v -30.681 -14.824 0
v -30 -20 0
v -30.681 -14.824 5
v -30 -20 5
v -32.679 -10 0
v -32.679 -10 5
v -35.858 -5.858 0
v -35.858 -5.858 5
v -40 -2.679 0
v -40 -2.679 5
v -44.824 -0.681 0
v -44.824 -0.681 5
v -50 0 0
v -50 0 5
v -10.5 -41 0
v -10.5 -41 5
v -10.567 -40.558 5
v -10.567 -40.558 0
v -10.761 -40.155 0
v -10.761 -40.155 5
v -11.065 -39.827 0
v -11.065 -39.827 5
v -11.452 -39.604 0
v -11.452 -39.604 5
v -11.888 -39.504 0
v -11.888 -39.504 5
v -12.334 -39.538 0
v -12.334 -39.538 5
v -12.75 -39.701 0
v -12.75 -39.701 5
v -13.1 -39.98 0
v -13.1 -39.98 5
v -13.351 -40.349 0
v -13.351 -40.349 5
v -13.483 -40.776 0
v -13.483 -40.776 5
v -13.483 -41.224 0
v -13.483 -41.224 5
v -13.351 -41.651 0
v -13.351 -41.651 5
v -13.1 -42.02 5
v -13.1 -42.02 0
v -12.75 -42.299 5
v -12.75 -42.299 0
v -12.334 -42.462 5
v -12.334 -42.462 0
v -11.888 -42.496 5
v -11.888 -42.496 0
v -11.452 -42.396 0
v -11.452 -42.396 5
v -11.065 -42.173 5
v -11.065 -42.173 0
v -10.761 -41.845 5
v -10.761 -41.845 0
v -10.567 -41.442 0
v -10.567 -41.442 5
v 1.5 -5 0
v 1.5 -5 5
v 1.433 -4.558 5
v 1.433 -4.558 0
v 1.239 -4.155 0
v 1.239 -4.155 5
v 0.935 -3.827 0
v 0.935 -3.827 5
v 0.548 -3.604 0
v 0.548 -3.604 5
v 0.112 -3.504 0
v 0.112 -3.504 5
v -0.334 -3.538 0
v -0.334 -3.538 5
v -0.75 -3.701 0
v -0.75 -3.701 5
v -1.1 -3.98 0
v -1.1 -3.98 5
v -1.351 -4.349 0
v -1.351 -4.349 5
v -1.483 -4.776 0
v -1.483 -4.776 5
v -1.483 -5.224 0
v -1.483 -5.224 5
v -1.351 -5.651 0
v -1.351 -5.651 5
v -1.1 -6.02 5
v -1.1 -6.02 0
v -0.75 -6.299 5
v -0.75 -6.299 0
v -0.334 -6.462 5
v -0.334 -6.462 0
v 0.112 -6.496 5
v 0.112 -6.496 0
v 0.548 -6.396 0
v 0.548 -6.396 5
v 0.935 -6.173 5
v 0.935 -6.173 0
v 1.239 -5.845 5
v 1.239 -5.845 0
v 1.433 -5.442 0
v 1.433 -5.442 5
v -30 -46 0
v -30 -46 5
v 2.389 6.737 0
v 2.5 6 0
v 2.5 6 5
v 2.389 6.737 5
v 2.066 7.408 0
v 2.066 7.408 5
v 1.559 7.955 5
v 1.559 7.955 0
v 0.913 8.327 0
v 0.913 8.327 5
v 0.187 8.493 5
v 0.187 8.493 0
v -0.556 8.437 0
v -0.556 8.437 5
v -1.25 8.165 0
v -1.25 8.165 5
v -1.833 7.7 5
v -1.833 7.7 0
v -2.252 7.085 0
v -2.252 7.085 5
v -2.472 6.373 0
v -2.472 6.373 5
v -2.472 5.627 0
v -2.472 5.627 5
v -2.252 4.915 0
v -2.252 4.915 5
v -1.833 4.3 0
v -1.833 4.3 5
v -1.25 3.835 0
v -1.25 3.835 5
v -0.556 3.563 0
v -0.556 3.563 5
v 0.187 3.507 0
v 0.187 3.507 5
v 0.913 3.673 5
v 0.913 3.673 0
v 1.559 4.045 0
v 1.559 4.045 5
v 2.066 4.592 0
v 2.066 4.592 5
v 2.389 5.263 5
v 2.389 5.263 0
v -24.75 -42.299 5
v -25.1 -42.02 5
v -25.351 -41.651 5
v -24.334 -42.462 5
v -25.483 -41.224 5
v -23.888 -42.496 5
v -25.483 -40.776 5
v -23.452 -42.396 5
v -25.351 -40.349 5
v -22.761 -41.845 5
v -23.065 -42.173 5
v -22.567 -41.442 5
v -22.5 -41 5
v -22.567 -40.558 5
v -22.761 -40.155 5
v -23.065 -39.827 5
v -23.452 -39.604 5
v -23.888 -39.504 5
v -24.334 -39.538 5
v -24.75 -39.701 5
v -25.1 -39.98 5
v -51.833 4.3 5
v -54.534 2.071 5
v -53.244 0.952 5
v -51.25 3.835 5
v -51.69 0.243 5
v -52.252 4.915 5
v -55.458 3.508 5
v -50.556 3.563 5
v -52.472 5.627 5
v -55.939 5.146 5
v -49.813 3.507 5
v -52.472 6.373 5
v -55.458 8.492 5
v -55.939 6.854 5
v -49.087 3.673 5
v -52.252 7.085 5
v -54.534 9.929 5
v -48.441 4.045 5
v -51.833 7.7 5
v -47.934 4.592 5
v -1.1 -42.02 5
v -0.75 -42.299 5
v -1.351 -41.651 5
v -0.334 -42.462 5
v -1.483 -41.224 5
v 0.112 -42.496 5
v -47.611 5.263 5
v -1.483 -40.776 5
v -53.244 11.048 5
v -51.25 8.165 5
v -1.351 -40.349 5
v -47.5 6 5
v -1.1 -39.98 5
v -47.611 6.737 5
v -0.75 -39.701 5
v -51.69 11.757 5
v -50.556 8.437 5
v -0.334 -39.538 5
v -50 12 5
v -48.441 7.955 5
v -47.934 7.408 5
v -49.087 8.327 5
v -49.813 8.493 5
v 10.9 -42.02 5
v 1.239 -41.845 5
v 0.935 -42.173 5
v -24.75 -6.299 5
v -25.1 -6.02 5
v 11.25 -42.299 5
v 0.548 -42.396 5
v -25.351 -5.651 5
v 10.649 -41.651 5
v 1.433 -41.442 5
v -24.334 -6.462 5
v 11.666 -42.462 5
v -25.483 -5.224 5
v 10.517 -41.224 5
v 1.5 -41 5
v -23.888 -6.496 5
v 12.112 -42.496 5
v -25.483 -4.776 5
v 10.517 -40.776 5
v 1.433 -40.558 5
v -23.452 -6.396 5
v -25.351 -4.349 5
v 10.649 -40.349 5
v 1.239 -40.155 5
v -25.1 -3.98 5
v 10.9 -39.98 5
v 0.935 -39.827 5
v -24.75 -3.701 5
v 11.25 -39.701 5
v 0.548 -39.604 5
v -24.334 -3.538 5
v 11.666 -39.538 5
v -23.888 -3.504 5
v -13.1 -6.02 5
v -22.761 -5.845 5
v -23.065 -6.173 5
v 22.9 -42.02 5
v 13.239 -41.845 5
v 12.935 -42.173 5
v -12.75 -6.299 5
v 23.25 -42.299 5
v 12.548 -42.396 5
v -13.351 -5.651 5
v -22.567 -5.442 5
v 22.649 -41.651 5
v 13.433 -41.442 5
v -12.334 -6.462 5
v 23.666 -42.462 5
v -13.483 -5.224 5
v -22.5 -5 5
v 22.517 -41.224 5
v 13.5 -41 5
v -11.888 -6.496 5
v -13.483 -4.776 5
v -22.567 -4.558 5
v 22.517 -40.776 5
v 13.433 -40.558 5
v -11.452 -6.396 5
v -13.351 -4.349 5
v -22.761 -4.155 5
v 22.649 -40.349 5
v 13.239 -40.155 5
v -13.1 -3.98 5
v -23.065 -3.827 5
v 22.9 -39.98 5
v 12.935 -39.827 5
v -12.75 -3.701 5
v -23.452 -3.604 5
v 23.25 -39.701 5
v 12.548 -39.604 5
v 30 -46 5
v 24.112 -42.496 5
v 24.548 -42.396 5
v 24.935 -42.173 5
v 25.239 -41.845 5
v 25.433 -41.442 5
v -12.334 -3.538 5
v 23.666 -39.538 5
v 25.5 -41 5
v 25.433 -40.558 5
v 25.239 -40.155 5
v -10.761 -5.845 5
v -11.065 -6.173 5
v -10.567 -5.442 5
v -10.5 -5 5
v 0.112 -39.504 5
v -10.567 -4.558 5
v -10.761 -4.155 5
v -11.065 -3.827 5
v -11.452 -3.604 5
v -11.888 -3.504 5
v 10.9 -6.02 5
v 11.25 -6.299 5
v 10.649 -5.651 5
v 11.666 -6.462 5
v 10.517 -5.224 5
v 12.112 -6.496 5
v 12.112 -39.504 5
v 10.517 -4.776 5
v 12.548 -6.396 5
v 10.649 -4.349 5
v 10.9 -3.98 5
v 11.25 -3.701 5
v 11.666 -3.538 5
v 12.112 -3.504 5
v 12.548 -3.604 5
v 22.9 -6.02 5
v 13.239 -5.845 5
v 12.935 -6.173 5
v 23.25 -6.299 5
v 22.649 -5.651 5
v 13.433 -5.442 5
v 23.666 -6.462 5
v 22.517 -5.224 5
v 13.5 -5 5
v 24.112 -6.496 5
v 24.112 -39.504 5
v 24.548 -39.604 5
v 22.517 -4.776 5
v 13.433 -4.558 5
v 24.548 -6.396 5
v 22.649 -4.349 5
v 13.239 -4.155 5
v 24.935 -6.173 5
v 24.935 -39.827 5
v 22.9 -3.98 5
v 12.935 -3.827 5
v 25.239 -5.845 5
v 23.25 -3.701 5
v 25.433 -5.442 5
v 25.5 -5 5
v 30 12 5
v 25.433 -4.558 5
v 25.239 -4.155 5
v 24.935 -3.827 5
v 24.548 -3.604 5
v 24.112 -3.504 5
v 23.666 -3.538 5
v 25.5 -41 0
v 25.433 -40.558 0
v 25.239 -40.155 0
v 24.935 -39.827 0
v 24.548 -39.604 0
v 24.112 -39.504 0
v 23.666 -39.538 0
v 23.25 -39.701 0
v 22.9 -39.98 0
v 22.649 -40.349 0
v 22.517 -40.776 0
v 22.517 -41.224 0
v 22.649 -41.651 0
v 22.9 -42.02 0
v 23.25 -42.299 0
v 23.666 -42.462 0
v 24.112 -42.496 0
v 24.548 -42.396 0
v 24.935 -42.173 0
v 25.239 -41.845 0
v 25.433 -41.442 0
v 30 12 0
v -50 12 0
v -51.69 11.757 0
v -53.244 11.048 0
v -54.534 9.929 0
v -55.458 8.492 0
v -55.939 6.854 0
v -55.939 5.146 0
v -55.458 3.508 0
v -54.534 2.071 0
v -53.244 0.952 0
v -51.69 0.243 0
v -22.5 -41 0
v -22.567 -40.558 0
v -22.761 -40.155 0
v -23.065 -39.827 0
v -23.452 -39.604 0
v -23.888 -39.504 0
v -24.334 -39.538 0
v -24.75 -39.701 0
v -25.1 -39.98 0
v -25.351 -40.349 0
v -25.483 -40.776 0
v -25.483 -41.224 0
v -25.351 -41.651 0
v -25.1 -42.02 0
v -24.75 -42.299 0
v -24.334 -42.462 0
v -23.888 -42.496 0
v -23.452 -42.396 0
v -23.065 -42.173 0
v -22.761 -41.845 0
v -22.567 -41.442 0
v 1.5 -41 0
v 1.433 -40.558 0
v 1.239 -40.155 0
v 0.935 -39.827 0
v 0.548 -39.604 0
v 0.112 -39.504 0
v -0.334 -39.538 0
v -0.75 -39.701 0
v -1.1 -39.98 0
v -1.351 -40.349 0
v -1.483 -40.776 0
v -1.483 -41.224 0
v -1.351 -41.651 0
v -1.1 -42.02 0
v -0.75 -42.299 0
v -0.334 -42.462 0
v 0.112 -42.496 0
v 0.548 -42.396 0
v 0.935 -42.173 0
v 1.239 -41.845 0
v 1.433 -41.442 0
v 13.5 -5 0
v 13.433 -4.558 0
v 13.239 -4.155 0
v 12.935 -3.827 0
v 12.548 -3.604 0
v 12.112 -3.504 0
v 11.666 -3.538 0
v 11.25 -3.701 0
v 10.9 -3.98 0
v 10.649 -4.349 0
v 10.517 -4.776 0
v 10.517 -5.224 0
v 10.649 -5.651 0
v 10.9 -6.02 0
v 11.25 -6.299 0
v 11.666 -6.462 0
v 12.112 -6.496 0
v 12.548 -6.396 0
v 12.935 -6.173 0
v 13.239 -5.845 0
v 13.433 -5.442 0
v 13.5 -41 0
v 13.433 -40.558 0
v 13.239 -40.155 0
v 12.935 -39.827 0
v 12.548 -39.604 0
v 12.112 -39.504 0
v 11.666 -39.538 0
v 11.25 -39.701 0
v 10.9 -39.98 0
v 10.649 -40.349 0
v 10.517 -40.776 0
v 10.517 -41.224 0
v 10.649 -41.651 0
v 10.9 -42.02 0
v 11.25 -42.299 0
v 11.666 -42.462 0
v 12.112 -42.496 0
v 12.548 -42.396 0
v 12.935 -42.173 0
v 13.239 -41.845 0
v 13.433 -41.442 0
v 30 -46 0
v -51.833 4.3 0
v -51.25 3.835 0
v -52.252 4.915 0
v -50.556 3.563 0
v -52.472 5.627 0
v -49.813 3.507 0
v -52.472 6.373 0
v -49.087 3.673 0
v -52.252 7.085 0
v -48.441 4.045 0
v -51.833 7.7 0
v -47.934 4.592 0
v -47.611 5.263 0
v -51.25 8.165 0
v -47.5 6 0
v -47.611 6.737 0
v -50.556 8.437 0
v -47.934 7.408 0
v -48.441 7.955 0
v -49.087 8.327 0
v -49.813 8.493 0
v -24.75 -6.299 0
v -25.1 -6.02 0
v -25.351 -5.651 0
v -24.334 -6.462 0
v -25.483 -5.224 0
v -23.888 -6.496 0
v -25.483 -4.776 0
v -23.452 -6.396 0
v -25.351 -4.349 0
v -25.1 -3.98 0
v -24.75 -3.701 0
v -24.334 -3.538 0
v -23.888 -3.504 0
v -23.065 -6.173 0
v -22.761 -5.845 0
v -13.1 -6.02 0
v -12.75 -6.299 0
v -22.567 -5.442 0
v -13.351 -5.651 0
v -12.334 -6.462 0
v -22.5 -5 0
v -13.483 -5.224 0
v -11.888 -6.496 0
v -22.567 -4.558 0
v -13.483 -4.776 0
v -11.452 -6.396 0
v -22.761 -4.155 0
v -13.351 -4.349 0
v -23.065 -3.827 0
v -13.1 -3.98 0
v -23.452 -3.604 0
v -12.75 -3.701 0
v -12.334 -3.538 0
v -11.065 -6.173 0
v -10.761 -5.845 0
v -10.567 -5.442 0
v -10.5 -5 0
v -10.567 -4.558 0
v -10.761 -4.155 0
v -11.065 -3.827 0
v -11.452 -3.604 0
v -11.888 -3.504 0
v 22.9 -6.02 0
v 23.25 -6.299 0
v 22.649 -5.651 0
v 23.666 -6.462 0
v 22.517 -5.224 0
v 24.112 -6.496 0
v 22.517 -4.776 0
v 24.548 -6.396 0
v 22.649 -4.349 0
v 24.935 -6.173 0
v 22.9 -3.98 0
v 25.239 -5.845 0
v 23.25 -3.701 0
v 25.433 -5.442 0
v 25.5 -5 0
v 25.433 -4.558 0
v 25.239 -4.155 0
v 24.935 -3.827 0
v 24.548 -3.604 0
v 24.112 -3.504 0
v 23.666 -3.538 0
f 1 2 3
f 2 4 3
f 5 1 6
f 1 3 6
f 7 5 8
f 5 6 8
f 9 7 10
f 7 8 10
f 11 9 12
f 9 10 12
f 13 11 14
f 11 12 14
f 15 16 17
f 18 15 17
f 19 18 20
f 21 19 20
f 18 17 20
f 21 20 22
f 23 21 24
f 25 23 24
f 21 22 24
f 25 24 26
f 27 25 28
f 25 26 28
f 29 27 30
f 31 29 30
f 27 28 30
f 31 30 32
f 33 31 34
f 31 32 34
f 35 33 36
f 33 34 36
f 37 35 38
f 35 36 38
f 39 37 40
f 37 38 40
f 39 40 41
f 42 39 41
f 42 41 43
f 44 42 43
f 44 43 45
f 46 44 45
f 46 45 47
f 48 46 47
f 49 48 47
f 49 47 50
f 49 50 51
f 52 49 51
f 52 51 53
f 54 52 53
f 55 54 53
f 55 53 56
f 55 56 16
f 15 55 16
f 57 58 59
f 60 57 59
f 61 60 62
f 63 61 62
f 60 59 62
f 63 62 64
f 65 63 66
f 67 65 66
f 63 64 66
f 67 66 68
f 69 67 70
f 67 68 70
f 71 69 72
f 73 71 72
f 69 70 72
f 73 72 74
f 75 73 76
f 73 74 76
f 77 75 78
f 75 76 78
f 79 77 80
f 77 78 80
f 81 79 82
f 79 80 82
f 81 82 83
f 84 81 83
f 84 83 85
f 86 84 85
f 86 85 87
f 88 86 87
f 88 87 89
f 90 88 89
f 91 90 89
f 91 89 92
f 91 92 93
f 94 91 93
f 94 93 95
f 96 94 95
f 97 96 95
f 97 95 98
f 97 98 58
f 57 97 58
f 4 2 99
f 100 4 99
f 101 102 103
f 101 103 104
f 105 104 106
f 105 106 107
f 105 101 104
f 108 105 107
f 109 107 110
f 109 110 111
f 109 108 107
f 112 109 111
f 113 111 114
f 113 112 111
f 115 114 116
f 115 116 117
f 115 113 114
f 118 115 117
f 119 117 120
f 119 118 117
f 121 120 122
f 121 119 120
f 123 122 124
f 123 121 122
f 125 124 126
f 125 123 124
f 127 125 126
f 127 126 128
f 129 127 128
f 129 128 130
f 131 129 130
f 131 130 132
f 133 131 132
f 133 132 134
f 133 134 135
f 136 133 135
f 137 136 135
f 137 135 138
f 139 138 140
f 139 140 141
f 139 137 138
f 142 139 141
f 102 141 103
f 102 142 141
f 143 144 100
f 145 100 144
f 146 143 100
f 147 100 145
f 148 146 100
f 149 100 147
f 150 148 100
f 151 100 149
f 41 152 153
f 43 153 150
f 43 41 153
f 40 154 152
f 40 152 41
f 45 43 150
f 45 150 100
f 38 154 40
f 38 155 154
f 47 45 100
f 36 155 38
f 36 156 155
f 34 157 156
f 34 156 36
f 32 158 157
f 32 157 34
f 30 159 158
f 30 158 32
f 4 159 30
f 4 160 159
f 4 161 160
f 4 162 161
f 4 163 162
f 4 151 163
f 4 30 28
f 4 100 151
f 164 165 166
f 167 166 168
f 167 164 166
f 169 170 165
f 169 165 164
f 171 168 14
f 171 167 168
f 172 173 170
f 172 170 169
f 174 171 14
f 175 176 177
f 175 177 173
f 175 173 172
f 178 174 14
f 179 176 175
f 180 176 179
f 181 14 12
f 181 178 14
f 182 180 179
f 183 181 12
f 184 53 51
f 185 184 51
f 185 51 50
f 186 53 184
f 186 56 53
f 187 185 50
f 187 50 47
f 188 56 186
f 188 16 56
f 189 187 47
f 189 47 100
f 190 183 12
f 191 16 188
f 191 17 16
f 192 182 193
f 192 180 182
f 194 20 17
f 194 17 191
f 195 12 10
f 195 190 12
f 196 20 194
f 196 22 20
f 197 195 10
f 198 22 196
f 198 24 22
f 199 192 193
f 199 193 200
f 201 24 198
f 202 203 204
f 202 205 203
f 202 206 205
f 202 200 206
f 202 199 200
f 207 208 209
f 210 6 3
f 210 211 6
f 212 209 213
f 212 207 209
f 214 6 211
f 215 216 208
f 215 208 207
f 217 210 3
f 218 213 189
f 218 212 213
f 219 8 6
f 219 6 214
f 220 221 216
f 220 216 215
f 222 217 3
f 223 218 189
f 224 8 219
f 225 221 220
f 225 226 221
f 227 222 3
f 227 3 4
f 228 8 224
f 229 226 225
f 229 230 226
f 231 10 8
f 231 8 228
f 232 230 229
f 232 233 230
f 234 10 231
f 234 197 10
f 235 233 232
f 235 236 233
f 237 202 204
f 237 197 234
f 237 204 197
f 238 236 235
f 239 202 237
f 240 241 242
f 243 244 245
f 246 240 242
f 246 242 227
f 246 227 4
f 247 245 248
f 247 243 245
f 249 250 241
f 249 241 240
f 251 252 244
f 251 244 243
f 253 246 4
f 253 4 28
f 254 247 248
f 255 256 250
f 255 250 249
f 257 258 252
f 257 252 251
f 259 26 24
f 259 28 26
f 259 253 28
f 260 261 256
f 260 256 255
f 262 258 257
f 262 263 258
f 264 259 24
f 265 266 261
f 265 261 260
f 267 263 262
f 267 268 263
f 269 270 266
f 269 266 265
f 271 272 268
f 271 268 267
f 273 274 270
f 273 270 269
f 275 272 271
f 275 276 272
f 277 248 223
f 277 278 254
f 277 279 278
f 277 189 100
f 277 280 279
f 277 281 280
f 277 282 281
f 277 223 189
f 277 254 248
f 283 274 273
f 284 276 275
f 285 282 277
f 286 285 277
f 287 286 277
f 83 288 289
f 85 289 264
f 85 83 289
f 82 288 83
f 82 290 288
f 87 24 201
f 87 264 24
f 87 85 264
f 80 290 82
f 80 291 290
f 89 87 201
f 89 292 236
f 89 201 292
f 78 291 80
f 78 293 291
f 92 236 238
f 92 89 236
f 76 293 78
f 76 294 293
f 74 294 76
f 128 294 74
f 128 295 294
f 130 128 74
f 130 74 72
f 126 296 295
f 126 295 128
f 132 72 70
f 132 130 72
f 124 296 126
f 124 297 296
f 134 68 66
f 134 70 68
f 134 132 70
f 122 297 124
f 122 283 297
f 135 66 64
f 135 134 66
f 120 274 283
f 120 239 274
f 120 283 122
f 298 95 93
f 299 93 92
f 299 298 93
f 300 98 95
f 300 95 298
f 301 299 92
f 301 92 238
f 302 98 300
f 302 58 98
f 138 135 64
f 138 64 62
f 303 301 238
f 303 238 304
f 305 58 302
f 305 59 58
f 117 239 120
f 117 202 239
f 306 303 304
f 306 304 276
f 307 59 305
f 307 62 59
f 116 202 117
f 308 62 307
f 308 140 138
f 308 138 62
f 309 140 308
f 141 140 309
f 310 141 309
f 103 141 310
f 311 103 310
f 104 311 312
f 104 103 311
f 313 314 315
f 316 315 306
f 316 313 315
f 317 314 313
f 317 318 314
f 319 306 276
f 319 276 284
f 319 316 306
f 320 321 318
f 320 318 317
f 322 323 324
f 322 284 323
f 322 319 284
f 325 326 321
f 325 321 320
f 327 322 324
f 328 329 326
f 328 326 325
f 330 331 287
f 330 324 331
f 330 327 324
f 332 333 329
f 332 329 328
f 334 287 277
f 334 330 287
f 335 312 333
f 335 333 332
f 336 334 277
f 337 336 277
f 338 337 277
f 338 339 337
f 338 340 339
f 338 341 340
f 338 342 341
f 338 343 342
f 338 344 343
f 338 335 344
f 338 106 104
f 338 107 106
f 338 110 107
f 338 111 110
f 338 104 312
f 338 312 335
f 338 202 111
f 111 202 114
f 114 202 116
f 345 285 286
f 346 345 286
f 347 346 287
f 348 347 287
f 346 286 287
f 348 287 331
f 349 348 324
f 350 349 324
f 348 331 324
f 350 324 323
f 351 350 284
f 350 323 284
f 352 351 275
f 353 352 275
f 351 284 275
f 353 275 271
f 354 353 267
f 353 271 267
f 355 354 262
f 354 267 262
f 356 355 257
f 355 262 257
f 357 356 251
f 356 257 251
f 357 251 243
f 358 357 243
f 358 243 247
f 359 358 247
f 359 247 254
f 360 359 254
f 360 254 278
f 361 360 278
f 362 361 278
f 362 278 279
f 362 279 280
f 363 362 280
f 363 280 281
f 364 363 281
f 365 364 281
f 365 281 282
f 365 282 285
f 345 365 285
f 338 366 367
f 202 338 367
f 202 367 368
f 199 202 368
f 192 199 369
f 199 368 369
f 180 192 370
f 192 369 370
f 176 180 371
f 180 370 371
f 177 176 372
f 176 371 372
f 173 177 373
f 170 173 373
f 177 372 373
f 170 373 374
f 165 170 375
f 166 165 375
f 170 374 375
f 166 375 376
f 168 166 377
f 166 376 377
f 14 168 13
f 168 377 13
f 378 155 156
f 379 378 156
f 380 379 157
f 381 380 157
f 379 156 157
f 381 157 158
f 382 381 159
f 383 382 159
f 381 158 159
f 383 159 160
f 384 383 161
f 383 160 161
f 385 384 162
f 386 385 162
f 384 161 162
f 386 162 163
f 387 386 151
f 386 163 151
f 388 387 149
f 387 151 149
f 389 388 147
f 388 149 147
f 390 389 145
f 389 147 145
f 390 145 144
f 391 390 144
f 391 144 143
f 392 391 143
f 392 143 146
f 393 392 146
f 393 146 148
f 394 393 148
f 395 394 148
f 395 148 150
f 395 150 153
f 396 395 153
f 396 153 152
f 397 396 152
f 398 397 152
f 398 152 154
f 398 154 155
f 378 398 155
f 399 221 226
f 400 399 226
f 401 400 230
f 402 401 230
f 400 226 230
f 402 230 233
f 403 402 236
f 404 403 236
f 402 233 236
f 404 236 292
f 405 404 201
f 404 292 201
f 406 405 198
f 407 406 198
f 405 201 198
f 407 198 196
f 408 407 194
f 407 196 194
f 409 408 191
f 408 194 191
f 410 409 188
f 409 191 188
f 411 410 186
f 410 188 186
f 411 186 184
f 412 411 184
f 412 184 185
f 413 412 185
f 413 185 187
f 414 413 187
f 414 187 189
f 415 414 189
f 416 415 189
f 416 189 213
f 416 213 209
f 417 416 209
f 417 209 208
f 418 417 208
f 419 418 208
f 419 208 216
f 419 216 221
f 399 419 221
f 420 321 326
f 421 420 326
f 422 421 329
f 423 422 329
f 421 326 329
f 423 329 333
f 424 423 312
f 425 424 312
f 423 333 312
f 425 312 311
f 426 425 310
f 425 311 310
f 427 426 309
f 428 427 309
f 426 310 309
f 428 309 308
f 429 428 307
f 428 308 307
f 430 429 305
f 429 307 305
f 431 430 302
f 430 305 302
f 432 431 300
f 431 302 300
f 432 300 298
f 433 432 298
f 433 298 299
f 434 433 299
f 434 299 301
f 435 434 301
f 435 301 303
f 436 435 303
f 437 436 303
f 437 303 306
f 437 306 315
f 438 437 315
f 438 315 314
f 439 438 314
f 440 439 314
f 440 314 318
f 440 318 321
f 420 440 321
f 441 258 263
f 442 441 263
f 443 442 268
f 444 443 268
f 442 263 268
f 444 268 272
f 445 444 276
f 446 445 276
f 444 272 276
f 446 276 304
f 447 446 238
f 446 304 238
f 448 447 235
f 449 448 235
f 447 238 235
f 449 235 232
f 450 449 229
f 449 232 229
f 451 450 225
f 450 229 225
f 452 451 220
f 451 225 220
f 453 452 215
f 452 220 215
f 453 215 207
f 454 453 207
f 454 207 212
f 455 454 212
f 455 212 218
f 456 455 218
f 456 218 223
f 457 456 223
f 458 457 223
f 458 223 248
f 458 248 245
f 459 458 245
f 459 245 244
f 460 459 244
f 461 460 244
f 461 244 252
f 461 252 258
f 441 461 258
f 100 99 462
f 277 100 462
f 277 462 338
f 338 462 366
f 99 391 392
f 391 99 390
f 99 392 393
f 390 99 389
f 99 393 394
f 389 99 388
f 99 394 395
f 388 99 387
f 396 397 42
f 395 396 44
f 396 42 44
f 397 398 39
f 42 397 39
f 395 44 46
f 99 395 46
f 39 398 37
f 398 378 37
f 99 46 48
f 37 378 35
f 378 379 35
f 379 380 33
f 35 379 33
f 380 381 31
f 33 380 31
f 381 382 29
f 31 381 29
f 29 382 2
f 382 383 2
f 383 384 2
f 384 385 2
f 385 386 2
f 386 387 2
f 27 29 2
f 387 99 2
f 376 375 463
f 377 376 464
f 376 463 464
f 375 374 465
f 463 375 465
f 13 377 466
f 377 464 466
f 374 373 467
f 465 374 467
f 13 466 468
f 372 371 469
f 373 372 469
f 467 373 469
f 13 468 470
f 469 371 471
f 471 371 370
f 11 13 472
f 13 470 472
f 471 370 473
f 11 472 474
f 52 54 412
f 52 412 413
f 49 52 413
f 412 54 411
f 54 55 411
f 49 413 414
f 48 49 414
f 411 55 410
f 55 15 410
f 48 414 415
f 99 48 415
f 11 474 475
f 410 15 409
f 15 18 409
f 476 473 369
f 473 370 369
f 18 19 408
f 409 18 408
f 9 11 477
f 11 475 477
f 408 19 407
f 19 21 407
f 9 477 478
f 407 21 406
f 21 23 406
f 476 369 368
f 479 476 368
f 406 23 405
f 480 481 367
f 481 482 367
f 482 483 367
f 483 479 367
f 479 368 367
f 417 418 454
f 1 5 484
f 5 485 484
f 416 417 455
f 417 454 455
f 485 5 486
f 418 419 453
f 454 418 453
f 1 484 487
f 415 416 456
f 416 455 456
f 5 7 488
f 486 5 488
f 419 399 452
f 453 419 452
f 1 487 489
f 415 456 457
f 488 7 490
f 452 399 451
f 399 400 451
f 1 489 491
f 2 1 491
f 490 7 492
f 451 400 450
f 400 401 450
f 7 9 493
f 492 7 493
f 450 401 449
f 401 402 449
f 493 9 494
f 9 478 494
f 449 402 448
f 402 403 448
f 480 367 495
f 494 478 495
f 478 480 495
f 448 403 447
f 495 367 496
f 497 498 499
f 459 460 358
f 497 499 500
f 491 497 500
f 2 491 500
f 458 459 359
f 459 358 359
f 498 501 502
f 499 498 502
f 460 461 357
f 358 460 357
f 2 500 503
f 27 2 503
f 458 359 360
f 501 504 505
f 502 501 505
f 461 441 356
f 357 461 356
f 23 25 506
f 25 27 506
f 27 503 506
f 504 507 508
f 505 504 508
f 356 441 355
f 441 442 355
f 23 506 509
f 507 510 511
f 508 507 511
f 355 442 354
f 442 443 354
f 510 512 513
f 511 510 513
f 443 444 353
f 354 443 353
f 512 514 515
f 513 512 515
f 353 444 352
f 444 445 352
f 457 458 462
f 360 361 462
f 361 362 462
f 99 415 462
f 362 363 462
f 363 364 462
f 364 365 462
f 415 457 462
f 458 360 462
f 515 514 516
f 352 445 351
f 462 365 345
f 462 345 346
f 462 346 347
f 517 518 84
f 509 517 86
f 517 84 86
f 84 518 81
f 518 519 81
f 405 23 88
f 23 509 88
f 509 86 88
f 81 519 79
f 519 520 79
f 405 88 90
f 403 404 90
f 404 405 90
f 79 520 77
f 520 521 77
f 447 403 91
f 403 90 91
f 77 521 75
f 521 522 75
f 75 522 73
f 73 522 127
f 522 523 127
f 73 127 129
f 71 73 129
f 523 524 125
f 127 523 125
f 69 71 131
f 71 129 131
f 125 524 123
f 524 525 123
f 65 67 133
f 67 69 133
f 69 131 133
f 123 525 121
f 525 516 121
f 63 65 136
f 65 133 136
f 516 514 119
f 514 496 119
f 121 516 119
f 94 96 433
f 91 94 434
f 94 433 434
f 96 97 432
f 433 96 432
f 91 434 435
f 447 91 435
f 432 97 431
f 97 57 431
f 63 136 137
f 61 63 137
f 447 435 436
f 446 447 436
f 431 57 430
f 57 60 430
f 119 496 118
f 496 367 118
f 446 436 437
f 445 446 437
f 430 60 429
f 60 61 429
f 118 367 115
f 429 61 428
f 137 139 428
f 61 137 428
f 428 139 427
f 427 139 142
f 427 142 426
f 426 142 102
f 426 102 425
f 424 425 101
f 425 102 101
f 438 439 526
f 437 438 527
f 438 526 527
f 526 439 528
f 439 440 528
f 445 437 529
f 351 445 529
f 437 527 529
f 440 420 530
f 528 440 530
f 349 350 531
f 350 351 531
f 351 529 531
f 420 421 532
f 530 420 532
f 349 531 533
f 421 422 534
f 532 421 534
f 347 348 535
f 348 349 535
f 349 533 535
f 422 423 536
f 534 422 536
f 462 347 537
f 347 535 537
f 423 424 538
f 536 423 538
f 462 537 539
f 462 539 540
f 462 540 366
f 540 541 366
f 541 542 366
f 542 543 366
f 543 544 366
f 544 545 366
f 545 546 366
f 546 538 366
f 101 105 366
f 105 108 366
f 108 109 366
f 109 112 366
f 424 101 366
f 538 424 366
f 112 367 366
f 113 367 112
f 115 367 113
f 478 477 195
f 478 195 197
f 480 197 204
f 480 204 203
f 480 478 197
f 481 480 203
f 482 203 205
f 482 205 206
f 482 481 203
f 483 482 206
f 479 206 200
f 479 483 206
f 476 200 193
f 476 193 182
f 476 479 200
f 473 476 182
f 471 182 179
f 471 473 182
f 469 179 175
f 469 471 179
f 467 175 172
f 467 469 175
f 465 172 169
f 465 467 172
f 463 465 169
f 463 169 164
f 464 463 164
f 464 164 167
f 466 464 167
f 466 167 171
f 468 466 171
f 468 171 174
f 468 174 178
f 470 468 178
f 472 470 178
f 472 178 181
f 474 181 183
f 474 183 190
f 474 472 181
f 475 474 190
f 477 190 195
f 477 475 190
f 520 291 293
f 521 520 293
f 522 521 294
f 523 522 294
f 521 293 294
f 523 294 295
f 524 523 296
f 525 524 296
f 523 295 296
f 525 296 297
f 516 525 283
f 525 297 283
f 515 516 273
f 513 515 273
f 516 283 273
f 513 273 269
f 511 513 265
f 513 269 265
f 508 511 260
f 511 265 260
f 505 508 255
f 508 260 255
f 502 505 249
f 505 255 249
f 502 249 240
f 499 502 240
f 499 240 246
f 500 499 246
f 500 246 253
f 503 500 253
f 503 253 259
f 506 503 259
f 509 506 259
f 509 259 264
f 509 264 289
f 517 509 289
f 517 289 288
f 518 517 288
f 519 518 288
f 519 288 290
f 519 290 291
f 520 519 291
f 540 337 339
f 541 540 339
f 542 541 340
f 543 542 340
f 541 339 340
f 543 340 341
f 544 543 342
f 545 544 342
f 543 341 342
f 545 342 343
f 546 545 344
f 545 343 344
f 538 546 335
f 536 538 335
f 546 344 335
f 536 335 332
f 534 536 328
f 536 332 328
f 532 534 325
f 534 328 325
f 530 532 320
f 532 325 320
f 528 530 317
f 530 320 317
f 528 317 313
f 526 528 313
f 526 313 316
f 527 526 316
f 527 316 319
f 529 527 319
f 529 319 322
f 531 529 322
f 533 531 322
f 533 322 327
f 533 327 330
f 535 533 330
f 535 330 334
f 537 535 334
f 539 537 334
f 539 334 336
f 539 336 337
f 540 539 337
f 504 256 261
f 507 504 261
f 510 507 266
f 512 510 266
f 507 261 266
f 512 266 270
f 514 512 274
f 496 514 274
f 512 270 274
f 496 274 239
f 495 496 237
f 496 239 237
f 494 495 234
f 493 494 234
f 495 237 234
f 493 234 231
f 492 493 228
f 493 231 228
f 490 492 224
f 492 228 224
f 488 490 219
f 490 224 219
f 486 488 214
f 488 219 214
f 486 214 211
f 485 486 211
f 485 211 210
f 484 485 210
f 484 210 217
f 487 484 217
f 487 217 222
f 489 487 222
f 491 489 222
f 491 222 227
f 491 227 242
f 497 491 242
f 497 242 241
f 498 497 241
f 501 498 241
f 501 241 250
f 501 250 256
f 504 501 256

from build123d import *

# Parameters (mm, degrees)
SKETCH_1_R             = 2.5
EXTRUDE_1_DEPTH        = 5
CUT_EXTRUDE_1_REACH    = 74.643
SKETCH_2_R             = 1.5
PATTERN_LINEAR_1_COUNT = 5
PATTERN_LINEAR_1_PITCH = 12
FILLET_1_R             = 20


with BuildPart() as part:
    # 草圖1 → 填料-伸長1 (new body)
    with BuildSketch(Plane.XY):
        with BuildLine():
            Line((-30, 0), (-30, -46))
            Line((-30, -46), (30, -46))
            Line((30, -46), (30, 0))
            Line((30, 0), (30, 12))
            Line((30, 12), (-50, 12))
            ThreePointArc((-50, 12), (-56, 6), (-50, 0))
            Line((-50, 0), (-30, 0))
        make_face()
        with Locations((0, 6)):
            Circle(SKETCH_1_R, mode=Mode.SUBTRACT)
        with Locations((-50, 6)):
            Circle(SKETCH_1_R, mode=Mode.SUBTRACT)
    extrude(amount=EXTRUDE_1_DEPTH)

    # 草圖2 → 除料-伸長1 (cut, up to next)
    with BuildSketch(Plane.XY.offset(5), mode=Mode.PRIVATE) as cut_extrude_1_sk1:
        with Locations((-24, -5)):
            Circle(SKETCH_2_R)
    cut_extrude_1_tool1 = extrude(cut_extrude_1_sk1.sketch, amount=-CUT_EXTRUDE_1_REACH, mode=Mode.PRIVATE) & part.part
    # 草圖2 → 除料-伸長1 (cut, up to next)
    with BuildSketch(Plane.XY.offset(5), mode=Mode.PRIVATE) as cut_extrude_1_sk2:
        with Locations((-24, -41)):
            Circle(SKETCH_2_R)
    cut_extrude_1_tool2 = extrude(cut_extrude_1_sk2.sketch, amount=-CUT_EXTRUDE_1_REACH, mode=Mode.PRIVATE) & part.part
    cut_extrude_1_1 = cut_extrude_1_tool1.solids().sort_by_distance((-24, -5, 5))[0]
    add(cut_extrude_1_1, mode=Mode.SUBTRACT)
    cut_extrude_1_2 = cut_extrude_1_tool2.solids().sort_by_distance((-24, -41, 5))[0]
    add(cut_extrude_1_2, mode=Mode.SUBTRACT)
    cut_extrude_1 = cut_extrude_1_1 + cut_extrude_1_2  # 除料-伸長1 as one shape, for the pattern or mirror that repeats it

    # 直線複製排列1: 除料-伸長1 ×5
    with Locations(*[(i * PATTERN_LINEAR_1_PITCH, 0, 0) for i in range(1, PATTERN_LINEAR_1_COUNT)]):
        add(cut_extrude_1, mode=Mode.SUBTRACT)

    # 圓角1
    fillet_1_edges = [part.edges().sort_by_distance(p)[0] for p in [
        (-30, 0, 2.5),
    ]]
    fillet(fillet_1_edges, radius=FILLET_1_R - 0.0001)  # a hair under: the kernel refuses the full size


solid = part.part
